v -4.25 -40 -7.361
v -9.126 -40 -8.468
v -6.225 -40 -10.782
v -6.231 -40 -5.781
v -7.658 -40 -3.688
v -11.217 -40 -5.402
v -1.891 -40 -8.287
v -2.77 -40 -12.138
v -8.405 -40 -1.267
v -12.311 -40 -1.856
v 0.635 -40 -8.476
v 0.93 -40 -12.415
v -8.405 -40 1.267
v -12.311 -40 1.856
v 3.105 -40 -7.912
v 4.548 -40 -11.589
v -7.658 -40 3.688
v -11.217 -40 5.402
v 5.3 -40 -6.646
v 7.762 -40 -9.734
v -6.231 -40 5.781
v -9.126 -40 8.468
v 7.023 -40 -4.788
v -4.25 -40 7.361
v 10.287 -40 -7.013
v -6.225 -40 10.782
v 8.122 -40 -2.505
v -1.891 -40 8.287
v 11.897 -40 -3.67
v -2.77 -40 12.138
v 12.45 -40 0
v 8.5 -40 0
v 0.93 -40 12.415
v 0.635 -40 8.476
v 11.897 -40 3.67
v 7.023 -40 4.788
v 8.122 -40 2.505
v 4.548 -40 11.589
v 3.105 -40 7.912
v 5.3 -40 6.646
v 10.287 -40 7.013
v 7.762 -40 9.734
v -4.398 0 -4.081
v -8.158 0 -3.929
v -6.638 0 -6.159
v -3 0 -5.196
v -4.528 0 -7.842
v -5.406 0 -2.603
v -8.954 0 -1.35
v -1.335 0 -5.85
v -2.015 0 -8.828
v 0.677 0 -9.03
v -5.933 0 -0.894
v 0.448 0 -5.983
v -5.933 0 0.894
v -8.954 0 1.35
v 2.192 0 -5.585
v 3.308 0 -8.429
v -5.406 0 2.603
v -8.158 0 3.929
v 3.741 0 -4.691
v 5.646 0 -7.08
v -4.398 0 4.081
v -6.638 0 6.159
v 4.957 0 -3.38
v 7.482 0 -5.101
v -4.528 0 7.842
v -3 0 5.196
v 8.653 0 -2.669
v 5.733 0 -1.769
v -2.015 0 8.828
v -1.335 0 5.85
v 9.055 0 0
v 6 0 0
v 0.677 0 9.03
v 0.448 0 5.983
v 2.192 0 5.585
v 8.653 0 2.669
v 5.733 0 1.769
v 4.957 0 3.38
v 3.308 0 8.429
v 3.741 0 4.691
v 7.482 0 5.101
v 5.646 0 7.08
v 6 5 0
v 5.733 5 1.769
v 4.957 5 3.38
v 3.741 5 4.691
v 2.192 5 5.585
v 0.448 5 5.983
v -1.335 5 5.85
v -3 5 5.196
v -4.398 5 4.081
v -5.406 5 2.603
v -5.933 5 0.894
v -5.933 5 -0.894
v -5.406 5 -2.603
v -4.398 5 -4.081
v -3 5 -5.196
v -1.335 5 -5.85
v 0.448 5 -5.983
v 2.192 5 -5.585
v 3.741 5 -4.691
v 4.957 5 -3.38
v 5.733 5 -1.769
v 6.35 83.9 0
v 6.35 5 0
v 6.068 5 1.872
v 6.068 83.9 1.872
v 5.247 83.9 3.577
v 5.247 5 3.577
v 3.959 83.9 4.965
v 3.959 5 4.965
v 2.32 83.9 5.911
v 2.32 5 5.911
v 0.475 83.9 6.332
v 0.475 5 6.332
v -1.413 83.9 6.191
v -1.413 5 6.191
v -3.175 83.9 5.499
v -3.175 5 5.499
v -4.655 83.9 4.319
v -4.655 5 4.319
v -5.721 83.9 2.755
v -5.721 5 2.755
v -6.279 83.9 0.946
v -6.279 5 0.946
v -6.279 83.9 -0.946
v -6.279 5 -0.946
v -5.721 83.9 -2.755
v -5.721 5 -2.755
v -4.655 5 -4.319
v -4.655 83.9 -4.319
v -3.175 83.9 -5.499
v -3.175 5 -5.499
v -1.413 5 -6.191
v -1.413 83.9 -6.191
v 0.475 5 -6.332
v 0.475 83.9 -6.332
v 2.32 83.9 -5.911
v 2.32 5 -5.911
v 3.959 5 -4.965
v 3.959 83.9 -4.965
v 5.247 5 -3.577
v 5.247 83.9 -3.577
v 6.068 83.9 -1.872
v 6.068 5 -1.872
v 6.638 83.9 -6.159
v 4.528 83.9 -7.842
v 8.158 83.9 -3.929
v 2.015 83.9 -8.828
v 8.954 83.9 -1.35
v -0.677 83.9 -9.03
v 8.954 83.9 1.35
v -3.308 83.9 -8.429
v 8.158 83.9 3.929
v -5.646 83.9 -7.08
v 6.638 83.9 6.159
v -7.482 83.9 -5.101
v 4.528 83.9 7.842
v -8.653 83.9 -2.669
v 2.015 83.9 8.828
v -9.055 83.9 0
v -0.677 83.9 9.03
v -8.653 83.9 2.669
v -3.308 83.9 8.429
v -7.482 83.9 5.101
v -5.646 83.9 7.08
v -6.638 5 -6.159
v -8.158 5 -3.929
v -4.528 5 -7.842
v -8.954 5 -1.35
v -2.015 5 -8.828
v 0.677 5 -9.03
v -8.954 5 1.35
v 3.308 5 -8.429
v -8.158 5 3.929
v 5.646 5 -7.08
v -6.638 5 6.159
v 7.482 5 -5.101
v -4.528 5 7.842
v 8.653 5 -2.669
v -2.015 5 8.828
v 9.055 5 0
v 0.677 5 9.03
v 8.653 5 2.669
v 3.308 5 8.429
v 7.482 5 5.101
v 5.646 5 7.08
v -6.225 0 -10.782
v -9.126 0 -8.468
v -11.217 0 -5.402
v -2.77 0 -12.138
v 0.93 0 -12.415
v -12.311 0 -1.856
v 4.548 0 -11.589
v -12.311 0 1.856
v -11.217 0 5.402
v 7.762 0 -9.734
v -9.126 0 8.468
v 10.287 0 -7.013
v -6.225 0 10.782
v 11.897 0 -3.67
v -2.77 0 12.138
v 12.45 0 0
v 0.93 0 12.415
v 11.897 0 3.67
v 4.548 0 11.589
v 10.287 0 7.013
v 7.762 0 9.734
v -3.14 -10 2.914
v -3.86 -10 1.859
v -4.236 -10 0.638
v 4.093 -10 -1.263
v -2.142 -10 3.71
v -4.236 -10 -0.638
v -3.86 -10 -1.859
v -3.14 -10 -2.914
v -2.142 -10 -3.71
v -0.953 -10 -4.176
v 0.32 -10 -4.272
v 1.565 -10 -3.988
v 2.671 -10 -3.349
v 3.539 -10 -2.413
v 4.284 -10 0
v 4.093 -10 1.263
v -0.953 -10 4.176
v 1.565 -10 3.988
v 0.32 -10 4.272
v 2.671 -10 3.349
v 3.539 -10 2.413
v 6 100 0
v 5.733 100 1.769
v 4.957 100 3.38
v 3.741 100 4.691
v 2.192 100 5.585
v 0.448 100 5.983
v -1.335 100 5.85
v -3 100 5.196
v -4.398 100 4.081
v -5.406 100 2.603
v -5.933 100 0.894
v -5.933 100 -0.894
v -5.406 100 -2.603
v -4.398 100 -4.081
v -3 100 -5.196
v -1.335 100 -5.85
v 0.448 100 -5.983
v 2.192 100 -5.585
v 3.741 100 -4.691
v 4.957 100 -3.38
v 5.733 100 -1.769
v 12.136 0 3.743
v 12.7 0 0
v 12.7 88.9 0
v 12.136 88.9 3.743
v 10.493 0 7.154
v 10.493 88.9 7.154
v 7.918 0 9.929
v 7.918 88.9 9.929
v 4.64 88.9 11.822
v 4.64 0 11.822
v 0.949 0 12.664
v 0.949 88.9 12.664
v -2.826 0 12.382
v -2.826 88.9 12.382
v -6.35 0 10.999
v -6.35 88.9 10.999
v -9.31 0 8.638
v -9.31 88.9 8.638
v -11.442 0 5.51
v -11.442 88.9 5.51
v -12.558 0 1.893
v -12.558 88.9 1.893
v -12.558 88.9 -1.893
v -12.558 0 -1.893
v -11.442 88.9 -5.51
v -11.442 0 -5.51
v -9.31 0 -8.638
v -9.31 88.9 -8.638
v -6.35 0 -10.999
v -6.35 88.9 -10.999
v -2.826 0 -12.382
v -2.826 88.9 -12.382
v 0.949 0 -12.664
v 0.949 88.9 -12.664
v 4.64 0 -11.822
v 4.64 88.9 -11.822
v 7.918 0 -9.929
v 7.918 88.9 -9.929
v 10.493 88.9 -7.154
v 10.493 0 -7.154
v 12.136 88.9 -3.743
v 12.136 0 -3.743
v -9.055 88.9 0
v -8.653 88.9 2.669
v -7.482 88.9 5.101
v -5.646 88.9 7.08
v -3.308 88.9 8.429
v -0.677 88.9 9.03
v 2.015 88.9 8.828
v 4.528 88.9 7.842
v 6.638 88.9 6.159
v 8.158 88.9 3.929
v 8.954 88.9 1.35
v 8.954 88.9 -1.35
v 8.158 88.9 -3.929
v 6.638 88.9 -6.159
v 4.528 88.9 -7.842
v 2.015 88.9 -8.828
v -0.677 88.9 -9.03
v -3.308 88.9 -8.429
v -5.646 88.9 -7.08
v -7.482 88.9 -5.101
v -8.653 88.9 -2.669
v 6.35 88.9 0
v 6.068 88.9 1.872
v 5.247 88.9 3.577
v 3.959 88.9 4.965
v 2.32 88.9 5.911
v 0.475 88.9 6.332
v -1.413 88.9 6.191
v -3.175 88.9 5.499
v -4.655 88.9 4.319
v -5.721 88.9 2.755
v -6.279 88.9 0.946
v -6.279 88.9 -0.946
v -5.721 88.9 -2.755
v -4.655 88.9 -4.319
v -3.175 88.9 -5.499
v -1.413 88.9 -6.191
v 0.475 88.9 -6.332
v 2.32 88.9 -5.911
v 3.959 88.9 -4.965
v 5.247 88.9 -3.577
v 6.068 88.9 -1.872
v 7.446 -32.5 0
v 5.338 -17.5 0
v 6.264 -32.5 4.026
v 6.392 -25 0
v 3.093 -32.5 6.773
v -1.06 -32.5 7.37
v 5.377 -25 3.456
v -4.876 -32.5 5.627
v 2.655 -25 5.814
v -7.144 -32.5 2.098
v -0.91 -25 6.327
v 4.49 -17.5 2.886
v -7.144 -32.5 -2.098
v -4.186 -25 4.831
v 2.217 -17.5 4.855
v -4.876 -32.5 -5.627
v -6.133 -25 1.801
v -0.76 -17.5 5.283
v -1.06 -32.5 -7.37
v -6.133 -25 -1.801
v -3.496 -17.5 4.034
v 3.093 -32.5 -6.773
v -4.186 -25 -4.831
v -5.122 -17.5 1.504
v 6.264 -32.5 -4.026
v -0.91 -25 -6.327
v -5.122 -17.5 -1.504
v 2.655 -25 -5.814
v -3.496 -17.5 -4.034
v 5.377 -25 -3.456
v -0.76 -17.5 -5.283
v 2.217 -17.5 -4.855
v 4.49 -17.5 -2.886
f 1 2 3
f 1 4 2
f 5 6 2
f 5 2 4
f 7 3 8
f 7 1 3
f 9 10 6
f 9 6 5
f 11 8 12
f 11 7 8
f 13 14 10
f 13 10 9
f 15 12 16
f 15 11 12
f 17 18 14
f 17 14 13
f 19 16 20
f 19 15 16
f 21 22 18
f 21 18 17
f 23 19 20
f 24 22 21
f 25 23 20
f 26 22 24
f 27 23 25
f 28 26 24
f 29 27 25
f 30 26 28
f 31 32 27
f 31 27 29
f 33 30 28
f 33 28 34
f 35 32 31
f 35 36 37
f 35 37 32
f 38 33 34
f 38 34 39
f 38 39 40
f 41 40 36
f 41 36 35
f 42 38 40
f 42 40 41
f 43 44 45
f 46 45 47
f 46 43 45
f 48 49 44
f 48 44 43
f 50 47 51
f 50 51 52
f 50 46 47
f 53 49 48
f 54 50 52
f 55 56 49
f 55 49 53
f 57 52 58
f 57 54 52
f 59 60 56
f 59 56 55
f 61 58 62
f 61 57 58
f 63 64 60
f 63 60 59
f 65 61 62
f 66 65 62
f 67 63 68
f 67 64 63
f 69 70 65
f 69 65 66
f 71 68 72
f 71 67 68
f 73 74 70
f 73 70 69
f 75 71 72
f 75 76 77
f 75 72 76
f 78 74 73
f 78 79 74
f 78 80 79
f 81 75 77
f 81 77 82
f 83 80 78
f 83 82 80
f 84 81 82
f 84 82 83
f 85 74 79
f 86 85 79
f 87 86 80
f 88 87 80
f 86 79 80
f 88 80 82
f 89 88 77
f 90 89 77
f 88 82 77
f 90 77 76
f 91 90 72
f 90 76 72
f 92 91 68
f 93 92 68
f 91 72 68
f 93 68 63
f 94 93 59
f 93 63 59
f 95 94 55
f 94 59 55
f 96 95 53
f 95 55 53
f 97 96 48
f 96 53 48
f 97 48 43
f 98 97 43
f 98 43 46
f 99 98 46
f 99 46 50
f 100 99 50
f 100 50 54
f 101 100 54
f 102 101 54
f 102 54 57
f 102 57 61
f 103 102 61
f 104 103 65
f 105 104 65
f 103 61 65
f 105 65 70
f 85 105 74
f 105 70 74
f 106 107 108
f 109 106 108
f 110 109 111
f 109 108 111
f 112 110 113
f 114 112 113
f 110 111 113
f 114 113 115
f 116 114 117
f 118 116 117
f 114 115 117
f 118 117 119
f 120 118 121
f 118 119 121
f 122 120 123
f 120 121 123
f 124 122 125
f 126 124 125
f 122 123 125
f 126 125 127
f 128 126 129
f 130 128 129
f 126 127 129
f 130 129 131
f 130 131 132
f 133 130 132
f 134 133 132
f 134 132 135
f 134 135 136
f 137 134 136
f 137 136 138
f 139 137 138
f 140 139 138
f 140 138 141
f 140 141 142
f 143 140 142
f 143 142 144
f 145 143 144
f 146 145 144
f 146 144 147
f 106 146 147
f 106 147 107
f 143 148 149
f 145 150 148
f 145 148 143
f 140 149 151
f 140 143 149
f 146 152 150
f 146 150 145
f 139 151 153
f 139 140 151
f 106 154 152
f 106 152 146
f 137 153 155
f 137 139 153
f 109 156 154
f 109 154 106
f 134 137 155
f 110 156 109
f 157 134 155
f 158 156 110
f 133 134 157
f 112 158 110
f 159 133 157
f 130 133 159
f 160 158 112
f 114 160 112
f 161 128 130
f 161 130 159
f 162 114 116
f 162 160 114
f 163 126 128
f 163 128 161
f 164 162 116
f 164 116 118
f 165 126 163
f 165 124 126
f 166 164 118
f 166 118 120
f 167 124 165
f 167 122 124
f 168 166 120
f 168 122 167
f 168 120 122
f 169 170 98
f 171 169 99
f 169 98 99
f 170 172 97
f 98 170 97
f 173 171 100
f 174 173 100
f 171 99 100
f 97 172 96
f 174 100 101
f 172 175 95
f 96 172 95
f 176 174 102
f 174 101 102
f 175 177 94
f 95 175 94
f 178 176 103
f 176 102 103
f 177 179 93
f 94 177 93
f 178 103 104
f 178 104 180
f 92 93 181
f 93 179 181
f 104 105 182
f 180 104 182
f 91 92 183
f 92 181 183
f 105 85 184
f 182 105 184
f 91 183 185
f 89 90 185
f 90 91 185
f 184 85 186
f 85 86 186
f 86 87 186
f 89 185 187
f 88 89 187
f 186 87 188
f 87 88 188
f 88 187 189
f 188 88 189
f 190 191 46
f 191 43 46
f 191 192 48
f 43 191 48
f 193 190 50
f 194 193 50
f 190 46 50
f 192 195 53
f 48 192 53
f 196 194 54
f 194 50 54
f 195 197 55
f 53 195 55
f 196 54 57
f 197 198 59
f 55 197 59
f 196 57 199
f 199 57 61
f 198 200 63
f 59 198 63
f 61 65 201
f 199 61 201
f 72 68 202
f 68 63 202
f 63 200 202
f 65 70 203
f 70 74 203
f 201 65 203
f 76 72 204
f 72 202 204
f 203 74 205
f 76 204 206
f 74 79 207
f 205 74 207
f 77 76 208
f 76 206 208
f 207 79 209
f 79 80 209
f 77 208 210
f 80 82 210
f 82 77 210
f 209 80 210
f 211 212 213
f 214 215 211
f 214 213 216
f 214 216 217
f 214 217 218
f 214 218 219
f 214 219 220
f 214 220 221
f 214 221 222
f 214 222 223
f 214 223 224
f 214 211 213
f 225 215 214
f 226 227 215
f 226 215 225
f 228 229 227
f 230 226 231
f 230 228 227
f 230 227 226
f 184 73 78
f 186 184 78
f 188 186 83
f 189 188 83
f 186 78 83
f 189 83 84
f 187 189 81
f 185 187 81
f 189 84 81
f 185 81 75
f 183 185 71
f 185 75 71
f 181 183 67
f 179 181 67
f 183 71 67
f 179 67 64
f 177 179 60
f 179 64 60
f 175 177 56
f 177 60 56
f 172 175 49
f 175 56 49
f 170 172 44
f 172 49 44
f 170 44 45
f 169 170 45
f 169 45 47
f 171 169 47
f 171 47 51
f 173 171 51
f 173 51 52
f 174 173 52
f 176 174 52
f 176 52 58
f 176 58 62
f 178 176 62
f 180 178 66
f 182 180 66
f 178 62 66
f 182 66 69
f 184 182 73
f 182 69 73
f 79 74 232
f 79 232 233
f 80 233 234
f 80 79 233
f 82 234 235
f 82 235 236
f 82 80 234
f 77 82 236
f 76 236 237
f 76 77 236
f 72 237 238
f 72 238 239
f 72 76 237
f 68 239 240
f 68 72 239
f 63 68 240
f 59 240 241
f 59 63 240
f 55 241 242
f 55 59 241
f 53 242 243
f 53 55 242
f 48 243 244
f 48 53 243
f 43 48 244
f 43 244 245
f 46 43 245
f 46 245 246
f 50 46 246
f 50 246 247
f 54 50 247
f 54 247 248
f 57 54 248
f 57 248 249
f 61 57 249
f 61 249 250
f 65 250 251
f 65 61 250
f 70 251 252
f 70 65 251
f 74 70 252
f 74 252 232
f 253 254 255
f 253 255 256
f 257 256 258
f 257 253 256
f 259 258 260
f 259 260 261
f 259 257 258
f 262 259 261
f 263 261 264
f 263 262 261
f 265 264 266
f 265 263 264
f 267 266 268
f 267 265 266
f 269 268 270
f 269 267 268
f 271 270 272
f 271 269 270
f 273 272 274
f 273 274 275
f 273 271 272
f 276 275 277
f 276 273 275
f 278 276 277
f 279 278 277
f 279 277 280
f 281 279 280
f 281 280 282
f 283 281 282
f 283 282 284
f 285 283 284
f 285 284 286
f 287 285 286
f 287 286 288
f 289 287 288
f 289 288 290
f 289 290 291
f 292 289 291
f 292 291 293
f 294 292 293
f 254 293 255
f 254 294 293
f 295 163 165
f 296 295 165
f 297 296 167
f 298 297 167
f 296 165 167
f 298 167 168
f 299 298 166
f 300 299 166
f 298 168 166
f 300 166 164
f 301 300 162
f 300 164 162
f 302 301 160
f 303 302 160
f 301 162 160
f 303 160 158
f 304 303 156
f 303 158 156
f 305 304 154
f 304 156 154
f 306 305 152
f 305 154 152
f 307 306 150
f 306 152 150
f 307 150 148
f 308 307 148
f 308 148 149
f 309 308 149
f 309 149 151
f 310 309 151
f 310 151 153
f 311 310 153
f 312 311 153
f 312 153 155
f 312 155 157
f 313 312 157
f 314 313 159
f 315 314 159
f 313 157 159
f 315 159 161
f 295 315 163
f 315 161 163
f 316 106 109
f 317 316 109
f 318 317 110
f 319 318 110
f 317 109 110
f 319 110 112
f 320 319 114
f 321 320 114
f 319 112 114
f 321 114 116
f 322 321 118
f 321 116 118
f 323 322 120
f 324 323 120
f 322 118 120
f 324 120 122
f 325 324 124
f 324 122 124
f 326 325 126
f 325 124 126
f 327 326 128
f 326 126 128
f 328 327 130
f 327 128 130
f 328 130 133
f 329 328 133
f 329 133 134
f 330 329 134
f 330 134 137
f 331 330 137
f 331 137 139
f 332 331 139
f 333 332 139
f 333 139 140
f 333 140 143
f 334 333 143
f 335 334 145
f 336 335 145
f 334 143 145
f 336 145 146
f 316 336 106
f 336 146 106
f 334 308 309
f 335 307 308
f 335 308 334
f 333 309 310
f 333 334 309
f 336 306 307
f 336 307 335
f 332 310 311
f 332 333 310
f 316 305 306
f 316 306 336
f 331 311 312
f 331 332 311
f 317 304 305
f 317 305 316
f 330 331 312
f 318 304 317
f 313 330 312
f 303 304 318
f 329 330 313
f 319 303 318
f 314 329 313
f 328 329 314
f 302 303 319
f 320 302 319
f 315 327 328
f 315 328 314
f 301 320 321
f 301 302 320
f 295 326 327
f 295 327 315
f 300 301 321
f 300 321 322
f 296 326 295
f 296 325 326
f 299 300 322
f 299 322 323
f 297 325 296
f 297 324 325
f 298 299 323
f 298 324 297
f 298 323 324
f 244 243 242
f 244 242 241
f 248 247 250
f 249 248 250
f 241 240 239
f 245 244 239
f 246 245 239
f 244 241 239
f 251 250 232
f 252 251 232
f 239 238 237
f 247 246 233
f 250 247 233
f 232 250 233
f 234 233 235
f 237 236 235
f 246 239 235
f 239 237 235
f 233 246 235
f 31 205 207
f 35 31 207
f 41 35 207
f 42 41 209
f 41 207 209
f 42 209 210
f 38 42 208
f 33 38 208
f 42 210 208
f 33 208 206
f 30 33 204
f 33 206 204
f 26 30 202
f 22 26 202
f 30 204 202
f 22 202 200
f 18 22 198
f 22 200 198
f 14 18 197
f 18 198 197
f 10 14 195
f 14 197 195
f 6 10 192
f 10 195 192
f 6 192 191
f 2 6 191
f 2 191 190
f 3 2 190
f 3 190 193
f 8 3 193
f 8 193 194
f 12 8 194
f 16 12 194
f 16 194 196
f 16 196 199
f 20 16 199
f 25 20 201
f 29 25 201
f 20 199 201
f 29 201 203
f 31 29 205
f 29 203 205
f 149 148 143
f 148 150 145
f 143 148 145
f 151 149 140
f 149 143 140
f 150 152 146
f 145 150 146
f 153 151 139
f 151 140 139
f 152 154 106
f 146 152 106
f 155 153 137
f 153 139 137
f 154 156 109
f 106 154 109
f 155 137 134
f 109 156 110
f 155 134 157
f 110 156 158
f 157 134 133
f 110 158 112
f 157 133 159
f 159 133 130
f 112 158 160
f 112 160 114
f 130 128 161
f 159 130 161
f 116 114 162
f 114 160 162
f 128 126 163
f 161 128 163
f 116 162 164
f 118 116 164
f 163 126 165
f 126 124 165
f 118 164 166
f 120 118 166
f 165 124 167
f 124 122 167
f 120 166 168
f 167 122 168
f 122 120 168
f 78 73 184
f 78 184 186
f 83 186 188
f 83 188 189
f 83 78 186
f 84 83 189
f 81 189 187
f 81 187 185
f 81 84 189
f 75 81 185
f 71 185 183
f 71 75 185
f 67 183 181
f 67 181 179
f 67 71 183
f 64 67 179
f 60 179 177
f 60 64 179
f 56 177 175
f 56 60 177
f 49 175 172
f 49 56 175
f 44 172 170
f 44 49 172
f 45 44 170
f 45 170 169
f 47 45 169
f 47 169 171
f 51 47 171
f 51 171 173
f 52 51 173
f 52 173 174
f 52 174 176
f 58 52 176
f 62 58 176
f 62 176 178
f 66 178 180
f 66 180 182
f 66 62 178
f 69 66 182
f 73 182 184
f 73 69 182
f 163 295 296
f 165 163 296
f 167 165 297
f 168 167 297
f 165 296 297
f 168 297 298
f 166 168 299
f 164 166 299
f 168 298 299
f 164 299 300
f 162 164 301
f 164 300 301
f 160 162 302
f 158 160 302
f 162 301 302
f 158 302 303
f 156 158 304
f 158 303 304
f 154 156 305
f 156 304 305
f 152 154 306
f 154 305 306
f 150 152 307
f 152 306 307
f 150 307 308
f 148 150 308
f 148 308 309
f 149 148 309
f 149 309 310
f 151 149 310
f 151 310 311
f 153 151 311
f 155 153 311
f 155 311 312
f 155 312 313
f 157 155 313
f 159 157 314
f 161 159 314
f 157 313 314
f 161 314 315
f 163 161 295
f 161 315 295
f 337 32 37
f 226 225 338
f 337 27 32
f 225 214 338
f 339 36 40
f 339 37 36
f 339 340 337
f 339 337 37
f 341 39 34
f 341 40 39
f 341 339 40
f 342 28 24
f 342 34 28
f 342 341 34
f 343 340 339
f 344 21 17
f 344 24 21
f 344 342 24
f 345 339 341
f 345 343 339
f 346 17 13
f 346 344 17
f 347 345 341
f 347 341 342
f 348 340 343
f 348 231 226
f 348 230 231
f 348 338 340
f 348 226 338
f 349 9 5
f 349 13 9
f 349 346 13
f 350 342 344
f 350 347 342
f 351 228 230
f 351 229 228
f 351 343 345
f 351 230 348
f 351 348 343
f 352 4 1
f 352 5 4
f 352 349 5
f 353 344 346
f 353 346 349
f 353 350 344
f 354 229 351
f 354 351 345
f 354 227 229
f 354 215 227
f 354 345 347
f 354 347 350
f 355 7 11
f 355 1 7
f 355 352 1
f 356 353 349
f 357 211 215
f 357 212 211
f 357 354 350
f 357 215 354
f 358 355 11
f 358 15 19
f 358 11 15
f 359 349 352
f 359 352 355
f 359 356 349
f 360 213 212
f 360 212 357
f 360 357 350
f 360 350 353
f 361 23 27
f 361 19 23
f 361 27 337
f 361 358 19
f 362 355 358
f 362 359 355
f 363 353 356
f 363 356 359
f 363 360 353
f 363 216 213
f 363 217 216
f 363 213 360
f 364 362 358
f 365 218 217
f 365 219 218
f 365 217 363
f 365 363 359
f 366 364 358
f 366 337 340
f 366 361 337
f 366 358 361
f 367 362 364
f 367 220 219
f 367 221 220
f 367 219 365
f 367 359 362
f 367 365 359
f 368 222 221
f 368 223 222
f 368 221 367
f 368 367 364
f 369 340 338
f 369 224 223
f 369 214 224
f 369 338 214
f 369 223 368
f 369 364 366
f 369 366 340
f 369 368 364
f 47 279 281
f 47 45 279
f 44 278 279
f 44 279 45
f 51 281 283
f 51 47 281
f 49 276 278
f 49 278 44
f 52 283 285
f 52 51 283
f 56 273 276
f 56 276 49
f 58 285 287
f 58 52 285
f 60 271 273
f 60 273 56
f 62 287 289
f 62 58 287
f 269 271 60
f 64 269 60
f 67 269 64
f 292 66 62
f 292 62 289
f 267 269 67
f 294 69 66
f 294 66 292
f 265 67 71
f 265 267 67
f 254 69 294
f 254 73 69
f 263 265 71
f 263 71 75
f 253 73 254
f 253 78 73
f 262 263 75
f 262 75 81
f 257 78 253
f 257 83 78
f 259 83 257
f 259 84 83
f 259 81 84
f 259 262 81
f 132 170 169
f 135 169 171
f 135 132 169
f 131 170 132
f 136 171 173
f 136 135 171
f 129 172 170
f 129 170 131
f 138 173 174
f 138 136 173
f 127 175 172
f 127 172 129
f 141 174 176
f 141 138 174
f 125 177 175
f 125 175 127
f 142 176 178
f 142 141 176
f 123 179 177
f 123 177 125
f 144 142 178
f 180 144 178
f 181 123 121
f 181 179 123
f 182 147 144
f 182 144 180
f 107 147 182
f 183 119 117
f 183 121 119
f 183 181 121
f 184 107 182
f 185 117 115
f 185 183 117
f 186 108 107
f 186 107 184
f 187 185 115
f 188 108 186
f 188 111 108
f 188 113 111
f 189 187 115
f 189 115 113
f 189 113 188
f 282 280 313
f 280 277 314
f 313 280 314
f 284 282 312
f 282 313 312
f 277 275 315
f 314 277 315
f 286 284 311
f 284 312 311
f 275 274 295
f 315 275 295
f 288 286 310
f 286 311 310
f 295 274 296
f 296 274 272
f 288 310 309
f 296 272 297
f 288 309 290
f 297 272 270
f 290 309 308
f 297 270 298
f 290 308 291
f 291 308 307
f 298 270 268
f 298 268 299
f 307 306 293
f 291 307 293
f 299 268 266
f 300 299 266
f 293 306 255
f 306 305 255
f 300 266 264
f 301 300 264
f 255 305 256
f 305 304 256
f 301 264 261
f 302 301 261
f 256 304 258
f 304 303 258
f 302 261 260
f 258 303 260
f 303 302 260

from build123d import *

# Parameters (mm, degrees)
F0_R      = 6
F1_DEPTH  = 100
F0_R_2    = 12.45
F0_R_3    = 9.0550614865
F0_R_4    = 6.35
F2_DEPTH  = 40
F3_R      = 8.5
F4_DEPTH  = 30
F4_TAPER  = 8
F0_R_5    = 12.7
F5_DEPTH  = 88.9
F6_DEPTH  = 5
F7_DEPTH  = 5
F8_R      = 9.0550619
F9_DEPTH  = 5
F10_DEPTH = 5


with BuildPart() as f1:
    # F0 (on Front) → F1 (new body)
    with BuildSketch(Plane.XZ):
        Circle(F0_R)
    extrude(amount=-F1_DEPTH)

    # F0 (on Front) → F2 (join)
    with BuildSketch(Plane.XZ):
        Circle(F0_R_2)
        Circle(F0_R_3, mode=Mode.SUBTRACT)
        Circle(F0_R_3)
        Circle(F0_R_4, mode=Mode.SUBTRACT)
        Circle(F0_R_4)
        Circle(F0_R, mode=Mode.SUBTRACT)
        Circle(F0_R)
    extrude(amount=F2_DEPTH)

    # F3 (on face) → F4 (cut)
    with BuildSketch(Plane.XZ.offset(40)):
        Circle(F3_R)
    extrude(amount=-F4_DEPTH, taper=F4_TAPER, mode=Mode.SUBTRACT)


with BuildPart() as f5:
    # F0 (on Front) → F5 (new body)
    with BuildSketch(Plane.XZ):
        Circle(F0_R_5)
        Circle(F0_R_2, mode=Mode.SUBTRACT)
        Circle(F0_R_2)
        Circle(F0_R_3, mode=Mode.SUBTRACT)
        Circle(F0_R_3)
        Circle(F0_R_4, mode=Mode.SUBTRACT)
    extrude(amount=-F5_DEPTH)

    # F0 (on Front) → F6 (cut)
    with BuildSketch(Plane.XZ):
        Circle(F0_R_3)
        Circle(F0_R_4, mode=Mode.SUBTRACT)
    extrude(amount=-F6_DEPTH, mode=Mode.SUBTRACT)

    # F8 (on face) → F9 (cut)
    with BuildSketch(Plane(origin=(0, 88.9, 0), x_dir=(-1, 0, 0), z_dir=(0, 1, 0))):
        Circle(F8_R)
    extrude(amount=-F9_DEPTH, mode=Mode.SUBTRACT)


with BuildPart() as f7:
    # F0 (on Front) → F7 (new body)
    with BuildSketch(Plane.XZ):
        Circle(F0_R_3)
        Circle(F0_R_4, mode=Mode.SUBTRACT)
        Circle(F0_R_4)
        Circle(F0_R, mode=Mode.SUBTRACT)
    extrude(amount=-F7_DEPTH)


with BuildPart() as f10:
    # F10 (new): a face of the model
    f10_faces = [f5.part.faces().sort_by_distance(p)[0] for p in [
        (8.7989460731, 83.9, 0),
    ]]
    extrude(f10_faces, amount=F10_DEPTH)


solid = Compound([f1.part, f5.part, f7.part, f10.part])
